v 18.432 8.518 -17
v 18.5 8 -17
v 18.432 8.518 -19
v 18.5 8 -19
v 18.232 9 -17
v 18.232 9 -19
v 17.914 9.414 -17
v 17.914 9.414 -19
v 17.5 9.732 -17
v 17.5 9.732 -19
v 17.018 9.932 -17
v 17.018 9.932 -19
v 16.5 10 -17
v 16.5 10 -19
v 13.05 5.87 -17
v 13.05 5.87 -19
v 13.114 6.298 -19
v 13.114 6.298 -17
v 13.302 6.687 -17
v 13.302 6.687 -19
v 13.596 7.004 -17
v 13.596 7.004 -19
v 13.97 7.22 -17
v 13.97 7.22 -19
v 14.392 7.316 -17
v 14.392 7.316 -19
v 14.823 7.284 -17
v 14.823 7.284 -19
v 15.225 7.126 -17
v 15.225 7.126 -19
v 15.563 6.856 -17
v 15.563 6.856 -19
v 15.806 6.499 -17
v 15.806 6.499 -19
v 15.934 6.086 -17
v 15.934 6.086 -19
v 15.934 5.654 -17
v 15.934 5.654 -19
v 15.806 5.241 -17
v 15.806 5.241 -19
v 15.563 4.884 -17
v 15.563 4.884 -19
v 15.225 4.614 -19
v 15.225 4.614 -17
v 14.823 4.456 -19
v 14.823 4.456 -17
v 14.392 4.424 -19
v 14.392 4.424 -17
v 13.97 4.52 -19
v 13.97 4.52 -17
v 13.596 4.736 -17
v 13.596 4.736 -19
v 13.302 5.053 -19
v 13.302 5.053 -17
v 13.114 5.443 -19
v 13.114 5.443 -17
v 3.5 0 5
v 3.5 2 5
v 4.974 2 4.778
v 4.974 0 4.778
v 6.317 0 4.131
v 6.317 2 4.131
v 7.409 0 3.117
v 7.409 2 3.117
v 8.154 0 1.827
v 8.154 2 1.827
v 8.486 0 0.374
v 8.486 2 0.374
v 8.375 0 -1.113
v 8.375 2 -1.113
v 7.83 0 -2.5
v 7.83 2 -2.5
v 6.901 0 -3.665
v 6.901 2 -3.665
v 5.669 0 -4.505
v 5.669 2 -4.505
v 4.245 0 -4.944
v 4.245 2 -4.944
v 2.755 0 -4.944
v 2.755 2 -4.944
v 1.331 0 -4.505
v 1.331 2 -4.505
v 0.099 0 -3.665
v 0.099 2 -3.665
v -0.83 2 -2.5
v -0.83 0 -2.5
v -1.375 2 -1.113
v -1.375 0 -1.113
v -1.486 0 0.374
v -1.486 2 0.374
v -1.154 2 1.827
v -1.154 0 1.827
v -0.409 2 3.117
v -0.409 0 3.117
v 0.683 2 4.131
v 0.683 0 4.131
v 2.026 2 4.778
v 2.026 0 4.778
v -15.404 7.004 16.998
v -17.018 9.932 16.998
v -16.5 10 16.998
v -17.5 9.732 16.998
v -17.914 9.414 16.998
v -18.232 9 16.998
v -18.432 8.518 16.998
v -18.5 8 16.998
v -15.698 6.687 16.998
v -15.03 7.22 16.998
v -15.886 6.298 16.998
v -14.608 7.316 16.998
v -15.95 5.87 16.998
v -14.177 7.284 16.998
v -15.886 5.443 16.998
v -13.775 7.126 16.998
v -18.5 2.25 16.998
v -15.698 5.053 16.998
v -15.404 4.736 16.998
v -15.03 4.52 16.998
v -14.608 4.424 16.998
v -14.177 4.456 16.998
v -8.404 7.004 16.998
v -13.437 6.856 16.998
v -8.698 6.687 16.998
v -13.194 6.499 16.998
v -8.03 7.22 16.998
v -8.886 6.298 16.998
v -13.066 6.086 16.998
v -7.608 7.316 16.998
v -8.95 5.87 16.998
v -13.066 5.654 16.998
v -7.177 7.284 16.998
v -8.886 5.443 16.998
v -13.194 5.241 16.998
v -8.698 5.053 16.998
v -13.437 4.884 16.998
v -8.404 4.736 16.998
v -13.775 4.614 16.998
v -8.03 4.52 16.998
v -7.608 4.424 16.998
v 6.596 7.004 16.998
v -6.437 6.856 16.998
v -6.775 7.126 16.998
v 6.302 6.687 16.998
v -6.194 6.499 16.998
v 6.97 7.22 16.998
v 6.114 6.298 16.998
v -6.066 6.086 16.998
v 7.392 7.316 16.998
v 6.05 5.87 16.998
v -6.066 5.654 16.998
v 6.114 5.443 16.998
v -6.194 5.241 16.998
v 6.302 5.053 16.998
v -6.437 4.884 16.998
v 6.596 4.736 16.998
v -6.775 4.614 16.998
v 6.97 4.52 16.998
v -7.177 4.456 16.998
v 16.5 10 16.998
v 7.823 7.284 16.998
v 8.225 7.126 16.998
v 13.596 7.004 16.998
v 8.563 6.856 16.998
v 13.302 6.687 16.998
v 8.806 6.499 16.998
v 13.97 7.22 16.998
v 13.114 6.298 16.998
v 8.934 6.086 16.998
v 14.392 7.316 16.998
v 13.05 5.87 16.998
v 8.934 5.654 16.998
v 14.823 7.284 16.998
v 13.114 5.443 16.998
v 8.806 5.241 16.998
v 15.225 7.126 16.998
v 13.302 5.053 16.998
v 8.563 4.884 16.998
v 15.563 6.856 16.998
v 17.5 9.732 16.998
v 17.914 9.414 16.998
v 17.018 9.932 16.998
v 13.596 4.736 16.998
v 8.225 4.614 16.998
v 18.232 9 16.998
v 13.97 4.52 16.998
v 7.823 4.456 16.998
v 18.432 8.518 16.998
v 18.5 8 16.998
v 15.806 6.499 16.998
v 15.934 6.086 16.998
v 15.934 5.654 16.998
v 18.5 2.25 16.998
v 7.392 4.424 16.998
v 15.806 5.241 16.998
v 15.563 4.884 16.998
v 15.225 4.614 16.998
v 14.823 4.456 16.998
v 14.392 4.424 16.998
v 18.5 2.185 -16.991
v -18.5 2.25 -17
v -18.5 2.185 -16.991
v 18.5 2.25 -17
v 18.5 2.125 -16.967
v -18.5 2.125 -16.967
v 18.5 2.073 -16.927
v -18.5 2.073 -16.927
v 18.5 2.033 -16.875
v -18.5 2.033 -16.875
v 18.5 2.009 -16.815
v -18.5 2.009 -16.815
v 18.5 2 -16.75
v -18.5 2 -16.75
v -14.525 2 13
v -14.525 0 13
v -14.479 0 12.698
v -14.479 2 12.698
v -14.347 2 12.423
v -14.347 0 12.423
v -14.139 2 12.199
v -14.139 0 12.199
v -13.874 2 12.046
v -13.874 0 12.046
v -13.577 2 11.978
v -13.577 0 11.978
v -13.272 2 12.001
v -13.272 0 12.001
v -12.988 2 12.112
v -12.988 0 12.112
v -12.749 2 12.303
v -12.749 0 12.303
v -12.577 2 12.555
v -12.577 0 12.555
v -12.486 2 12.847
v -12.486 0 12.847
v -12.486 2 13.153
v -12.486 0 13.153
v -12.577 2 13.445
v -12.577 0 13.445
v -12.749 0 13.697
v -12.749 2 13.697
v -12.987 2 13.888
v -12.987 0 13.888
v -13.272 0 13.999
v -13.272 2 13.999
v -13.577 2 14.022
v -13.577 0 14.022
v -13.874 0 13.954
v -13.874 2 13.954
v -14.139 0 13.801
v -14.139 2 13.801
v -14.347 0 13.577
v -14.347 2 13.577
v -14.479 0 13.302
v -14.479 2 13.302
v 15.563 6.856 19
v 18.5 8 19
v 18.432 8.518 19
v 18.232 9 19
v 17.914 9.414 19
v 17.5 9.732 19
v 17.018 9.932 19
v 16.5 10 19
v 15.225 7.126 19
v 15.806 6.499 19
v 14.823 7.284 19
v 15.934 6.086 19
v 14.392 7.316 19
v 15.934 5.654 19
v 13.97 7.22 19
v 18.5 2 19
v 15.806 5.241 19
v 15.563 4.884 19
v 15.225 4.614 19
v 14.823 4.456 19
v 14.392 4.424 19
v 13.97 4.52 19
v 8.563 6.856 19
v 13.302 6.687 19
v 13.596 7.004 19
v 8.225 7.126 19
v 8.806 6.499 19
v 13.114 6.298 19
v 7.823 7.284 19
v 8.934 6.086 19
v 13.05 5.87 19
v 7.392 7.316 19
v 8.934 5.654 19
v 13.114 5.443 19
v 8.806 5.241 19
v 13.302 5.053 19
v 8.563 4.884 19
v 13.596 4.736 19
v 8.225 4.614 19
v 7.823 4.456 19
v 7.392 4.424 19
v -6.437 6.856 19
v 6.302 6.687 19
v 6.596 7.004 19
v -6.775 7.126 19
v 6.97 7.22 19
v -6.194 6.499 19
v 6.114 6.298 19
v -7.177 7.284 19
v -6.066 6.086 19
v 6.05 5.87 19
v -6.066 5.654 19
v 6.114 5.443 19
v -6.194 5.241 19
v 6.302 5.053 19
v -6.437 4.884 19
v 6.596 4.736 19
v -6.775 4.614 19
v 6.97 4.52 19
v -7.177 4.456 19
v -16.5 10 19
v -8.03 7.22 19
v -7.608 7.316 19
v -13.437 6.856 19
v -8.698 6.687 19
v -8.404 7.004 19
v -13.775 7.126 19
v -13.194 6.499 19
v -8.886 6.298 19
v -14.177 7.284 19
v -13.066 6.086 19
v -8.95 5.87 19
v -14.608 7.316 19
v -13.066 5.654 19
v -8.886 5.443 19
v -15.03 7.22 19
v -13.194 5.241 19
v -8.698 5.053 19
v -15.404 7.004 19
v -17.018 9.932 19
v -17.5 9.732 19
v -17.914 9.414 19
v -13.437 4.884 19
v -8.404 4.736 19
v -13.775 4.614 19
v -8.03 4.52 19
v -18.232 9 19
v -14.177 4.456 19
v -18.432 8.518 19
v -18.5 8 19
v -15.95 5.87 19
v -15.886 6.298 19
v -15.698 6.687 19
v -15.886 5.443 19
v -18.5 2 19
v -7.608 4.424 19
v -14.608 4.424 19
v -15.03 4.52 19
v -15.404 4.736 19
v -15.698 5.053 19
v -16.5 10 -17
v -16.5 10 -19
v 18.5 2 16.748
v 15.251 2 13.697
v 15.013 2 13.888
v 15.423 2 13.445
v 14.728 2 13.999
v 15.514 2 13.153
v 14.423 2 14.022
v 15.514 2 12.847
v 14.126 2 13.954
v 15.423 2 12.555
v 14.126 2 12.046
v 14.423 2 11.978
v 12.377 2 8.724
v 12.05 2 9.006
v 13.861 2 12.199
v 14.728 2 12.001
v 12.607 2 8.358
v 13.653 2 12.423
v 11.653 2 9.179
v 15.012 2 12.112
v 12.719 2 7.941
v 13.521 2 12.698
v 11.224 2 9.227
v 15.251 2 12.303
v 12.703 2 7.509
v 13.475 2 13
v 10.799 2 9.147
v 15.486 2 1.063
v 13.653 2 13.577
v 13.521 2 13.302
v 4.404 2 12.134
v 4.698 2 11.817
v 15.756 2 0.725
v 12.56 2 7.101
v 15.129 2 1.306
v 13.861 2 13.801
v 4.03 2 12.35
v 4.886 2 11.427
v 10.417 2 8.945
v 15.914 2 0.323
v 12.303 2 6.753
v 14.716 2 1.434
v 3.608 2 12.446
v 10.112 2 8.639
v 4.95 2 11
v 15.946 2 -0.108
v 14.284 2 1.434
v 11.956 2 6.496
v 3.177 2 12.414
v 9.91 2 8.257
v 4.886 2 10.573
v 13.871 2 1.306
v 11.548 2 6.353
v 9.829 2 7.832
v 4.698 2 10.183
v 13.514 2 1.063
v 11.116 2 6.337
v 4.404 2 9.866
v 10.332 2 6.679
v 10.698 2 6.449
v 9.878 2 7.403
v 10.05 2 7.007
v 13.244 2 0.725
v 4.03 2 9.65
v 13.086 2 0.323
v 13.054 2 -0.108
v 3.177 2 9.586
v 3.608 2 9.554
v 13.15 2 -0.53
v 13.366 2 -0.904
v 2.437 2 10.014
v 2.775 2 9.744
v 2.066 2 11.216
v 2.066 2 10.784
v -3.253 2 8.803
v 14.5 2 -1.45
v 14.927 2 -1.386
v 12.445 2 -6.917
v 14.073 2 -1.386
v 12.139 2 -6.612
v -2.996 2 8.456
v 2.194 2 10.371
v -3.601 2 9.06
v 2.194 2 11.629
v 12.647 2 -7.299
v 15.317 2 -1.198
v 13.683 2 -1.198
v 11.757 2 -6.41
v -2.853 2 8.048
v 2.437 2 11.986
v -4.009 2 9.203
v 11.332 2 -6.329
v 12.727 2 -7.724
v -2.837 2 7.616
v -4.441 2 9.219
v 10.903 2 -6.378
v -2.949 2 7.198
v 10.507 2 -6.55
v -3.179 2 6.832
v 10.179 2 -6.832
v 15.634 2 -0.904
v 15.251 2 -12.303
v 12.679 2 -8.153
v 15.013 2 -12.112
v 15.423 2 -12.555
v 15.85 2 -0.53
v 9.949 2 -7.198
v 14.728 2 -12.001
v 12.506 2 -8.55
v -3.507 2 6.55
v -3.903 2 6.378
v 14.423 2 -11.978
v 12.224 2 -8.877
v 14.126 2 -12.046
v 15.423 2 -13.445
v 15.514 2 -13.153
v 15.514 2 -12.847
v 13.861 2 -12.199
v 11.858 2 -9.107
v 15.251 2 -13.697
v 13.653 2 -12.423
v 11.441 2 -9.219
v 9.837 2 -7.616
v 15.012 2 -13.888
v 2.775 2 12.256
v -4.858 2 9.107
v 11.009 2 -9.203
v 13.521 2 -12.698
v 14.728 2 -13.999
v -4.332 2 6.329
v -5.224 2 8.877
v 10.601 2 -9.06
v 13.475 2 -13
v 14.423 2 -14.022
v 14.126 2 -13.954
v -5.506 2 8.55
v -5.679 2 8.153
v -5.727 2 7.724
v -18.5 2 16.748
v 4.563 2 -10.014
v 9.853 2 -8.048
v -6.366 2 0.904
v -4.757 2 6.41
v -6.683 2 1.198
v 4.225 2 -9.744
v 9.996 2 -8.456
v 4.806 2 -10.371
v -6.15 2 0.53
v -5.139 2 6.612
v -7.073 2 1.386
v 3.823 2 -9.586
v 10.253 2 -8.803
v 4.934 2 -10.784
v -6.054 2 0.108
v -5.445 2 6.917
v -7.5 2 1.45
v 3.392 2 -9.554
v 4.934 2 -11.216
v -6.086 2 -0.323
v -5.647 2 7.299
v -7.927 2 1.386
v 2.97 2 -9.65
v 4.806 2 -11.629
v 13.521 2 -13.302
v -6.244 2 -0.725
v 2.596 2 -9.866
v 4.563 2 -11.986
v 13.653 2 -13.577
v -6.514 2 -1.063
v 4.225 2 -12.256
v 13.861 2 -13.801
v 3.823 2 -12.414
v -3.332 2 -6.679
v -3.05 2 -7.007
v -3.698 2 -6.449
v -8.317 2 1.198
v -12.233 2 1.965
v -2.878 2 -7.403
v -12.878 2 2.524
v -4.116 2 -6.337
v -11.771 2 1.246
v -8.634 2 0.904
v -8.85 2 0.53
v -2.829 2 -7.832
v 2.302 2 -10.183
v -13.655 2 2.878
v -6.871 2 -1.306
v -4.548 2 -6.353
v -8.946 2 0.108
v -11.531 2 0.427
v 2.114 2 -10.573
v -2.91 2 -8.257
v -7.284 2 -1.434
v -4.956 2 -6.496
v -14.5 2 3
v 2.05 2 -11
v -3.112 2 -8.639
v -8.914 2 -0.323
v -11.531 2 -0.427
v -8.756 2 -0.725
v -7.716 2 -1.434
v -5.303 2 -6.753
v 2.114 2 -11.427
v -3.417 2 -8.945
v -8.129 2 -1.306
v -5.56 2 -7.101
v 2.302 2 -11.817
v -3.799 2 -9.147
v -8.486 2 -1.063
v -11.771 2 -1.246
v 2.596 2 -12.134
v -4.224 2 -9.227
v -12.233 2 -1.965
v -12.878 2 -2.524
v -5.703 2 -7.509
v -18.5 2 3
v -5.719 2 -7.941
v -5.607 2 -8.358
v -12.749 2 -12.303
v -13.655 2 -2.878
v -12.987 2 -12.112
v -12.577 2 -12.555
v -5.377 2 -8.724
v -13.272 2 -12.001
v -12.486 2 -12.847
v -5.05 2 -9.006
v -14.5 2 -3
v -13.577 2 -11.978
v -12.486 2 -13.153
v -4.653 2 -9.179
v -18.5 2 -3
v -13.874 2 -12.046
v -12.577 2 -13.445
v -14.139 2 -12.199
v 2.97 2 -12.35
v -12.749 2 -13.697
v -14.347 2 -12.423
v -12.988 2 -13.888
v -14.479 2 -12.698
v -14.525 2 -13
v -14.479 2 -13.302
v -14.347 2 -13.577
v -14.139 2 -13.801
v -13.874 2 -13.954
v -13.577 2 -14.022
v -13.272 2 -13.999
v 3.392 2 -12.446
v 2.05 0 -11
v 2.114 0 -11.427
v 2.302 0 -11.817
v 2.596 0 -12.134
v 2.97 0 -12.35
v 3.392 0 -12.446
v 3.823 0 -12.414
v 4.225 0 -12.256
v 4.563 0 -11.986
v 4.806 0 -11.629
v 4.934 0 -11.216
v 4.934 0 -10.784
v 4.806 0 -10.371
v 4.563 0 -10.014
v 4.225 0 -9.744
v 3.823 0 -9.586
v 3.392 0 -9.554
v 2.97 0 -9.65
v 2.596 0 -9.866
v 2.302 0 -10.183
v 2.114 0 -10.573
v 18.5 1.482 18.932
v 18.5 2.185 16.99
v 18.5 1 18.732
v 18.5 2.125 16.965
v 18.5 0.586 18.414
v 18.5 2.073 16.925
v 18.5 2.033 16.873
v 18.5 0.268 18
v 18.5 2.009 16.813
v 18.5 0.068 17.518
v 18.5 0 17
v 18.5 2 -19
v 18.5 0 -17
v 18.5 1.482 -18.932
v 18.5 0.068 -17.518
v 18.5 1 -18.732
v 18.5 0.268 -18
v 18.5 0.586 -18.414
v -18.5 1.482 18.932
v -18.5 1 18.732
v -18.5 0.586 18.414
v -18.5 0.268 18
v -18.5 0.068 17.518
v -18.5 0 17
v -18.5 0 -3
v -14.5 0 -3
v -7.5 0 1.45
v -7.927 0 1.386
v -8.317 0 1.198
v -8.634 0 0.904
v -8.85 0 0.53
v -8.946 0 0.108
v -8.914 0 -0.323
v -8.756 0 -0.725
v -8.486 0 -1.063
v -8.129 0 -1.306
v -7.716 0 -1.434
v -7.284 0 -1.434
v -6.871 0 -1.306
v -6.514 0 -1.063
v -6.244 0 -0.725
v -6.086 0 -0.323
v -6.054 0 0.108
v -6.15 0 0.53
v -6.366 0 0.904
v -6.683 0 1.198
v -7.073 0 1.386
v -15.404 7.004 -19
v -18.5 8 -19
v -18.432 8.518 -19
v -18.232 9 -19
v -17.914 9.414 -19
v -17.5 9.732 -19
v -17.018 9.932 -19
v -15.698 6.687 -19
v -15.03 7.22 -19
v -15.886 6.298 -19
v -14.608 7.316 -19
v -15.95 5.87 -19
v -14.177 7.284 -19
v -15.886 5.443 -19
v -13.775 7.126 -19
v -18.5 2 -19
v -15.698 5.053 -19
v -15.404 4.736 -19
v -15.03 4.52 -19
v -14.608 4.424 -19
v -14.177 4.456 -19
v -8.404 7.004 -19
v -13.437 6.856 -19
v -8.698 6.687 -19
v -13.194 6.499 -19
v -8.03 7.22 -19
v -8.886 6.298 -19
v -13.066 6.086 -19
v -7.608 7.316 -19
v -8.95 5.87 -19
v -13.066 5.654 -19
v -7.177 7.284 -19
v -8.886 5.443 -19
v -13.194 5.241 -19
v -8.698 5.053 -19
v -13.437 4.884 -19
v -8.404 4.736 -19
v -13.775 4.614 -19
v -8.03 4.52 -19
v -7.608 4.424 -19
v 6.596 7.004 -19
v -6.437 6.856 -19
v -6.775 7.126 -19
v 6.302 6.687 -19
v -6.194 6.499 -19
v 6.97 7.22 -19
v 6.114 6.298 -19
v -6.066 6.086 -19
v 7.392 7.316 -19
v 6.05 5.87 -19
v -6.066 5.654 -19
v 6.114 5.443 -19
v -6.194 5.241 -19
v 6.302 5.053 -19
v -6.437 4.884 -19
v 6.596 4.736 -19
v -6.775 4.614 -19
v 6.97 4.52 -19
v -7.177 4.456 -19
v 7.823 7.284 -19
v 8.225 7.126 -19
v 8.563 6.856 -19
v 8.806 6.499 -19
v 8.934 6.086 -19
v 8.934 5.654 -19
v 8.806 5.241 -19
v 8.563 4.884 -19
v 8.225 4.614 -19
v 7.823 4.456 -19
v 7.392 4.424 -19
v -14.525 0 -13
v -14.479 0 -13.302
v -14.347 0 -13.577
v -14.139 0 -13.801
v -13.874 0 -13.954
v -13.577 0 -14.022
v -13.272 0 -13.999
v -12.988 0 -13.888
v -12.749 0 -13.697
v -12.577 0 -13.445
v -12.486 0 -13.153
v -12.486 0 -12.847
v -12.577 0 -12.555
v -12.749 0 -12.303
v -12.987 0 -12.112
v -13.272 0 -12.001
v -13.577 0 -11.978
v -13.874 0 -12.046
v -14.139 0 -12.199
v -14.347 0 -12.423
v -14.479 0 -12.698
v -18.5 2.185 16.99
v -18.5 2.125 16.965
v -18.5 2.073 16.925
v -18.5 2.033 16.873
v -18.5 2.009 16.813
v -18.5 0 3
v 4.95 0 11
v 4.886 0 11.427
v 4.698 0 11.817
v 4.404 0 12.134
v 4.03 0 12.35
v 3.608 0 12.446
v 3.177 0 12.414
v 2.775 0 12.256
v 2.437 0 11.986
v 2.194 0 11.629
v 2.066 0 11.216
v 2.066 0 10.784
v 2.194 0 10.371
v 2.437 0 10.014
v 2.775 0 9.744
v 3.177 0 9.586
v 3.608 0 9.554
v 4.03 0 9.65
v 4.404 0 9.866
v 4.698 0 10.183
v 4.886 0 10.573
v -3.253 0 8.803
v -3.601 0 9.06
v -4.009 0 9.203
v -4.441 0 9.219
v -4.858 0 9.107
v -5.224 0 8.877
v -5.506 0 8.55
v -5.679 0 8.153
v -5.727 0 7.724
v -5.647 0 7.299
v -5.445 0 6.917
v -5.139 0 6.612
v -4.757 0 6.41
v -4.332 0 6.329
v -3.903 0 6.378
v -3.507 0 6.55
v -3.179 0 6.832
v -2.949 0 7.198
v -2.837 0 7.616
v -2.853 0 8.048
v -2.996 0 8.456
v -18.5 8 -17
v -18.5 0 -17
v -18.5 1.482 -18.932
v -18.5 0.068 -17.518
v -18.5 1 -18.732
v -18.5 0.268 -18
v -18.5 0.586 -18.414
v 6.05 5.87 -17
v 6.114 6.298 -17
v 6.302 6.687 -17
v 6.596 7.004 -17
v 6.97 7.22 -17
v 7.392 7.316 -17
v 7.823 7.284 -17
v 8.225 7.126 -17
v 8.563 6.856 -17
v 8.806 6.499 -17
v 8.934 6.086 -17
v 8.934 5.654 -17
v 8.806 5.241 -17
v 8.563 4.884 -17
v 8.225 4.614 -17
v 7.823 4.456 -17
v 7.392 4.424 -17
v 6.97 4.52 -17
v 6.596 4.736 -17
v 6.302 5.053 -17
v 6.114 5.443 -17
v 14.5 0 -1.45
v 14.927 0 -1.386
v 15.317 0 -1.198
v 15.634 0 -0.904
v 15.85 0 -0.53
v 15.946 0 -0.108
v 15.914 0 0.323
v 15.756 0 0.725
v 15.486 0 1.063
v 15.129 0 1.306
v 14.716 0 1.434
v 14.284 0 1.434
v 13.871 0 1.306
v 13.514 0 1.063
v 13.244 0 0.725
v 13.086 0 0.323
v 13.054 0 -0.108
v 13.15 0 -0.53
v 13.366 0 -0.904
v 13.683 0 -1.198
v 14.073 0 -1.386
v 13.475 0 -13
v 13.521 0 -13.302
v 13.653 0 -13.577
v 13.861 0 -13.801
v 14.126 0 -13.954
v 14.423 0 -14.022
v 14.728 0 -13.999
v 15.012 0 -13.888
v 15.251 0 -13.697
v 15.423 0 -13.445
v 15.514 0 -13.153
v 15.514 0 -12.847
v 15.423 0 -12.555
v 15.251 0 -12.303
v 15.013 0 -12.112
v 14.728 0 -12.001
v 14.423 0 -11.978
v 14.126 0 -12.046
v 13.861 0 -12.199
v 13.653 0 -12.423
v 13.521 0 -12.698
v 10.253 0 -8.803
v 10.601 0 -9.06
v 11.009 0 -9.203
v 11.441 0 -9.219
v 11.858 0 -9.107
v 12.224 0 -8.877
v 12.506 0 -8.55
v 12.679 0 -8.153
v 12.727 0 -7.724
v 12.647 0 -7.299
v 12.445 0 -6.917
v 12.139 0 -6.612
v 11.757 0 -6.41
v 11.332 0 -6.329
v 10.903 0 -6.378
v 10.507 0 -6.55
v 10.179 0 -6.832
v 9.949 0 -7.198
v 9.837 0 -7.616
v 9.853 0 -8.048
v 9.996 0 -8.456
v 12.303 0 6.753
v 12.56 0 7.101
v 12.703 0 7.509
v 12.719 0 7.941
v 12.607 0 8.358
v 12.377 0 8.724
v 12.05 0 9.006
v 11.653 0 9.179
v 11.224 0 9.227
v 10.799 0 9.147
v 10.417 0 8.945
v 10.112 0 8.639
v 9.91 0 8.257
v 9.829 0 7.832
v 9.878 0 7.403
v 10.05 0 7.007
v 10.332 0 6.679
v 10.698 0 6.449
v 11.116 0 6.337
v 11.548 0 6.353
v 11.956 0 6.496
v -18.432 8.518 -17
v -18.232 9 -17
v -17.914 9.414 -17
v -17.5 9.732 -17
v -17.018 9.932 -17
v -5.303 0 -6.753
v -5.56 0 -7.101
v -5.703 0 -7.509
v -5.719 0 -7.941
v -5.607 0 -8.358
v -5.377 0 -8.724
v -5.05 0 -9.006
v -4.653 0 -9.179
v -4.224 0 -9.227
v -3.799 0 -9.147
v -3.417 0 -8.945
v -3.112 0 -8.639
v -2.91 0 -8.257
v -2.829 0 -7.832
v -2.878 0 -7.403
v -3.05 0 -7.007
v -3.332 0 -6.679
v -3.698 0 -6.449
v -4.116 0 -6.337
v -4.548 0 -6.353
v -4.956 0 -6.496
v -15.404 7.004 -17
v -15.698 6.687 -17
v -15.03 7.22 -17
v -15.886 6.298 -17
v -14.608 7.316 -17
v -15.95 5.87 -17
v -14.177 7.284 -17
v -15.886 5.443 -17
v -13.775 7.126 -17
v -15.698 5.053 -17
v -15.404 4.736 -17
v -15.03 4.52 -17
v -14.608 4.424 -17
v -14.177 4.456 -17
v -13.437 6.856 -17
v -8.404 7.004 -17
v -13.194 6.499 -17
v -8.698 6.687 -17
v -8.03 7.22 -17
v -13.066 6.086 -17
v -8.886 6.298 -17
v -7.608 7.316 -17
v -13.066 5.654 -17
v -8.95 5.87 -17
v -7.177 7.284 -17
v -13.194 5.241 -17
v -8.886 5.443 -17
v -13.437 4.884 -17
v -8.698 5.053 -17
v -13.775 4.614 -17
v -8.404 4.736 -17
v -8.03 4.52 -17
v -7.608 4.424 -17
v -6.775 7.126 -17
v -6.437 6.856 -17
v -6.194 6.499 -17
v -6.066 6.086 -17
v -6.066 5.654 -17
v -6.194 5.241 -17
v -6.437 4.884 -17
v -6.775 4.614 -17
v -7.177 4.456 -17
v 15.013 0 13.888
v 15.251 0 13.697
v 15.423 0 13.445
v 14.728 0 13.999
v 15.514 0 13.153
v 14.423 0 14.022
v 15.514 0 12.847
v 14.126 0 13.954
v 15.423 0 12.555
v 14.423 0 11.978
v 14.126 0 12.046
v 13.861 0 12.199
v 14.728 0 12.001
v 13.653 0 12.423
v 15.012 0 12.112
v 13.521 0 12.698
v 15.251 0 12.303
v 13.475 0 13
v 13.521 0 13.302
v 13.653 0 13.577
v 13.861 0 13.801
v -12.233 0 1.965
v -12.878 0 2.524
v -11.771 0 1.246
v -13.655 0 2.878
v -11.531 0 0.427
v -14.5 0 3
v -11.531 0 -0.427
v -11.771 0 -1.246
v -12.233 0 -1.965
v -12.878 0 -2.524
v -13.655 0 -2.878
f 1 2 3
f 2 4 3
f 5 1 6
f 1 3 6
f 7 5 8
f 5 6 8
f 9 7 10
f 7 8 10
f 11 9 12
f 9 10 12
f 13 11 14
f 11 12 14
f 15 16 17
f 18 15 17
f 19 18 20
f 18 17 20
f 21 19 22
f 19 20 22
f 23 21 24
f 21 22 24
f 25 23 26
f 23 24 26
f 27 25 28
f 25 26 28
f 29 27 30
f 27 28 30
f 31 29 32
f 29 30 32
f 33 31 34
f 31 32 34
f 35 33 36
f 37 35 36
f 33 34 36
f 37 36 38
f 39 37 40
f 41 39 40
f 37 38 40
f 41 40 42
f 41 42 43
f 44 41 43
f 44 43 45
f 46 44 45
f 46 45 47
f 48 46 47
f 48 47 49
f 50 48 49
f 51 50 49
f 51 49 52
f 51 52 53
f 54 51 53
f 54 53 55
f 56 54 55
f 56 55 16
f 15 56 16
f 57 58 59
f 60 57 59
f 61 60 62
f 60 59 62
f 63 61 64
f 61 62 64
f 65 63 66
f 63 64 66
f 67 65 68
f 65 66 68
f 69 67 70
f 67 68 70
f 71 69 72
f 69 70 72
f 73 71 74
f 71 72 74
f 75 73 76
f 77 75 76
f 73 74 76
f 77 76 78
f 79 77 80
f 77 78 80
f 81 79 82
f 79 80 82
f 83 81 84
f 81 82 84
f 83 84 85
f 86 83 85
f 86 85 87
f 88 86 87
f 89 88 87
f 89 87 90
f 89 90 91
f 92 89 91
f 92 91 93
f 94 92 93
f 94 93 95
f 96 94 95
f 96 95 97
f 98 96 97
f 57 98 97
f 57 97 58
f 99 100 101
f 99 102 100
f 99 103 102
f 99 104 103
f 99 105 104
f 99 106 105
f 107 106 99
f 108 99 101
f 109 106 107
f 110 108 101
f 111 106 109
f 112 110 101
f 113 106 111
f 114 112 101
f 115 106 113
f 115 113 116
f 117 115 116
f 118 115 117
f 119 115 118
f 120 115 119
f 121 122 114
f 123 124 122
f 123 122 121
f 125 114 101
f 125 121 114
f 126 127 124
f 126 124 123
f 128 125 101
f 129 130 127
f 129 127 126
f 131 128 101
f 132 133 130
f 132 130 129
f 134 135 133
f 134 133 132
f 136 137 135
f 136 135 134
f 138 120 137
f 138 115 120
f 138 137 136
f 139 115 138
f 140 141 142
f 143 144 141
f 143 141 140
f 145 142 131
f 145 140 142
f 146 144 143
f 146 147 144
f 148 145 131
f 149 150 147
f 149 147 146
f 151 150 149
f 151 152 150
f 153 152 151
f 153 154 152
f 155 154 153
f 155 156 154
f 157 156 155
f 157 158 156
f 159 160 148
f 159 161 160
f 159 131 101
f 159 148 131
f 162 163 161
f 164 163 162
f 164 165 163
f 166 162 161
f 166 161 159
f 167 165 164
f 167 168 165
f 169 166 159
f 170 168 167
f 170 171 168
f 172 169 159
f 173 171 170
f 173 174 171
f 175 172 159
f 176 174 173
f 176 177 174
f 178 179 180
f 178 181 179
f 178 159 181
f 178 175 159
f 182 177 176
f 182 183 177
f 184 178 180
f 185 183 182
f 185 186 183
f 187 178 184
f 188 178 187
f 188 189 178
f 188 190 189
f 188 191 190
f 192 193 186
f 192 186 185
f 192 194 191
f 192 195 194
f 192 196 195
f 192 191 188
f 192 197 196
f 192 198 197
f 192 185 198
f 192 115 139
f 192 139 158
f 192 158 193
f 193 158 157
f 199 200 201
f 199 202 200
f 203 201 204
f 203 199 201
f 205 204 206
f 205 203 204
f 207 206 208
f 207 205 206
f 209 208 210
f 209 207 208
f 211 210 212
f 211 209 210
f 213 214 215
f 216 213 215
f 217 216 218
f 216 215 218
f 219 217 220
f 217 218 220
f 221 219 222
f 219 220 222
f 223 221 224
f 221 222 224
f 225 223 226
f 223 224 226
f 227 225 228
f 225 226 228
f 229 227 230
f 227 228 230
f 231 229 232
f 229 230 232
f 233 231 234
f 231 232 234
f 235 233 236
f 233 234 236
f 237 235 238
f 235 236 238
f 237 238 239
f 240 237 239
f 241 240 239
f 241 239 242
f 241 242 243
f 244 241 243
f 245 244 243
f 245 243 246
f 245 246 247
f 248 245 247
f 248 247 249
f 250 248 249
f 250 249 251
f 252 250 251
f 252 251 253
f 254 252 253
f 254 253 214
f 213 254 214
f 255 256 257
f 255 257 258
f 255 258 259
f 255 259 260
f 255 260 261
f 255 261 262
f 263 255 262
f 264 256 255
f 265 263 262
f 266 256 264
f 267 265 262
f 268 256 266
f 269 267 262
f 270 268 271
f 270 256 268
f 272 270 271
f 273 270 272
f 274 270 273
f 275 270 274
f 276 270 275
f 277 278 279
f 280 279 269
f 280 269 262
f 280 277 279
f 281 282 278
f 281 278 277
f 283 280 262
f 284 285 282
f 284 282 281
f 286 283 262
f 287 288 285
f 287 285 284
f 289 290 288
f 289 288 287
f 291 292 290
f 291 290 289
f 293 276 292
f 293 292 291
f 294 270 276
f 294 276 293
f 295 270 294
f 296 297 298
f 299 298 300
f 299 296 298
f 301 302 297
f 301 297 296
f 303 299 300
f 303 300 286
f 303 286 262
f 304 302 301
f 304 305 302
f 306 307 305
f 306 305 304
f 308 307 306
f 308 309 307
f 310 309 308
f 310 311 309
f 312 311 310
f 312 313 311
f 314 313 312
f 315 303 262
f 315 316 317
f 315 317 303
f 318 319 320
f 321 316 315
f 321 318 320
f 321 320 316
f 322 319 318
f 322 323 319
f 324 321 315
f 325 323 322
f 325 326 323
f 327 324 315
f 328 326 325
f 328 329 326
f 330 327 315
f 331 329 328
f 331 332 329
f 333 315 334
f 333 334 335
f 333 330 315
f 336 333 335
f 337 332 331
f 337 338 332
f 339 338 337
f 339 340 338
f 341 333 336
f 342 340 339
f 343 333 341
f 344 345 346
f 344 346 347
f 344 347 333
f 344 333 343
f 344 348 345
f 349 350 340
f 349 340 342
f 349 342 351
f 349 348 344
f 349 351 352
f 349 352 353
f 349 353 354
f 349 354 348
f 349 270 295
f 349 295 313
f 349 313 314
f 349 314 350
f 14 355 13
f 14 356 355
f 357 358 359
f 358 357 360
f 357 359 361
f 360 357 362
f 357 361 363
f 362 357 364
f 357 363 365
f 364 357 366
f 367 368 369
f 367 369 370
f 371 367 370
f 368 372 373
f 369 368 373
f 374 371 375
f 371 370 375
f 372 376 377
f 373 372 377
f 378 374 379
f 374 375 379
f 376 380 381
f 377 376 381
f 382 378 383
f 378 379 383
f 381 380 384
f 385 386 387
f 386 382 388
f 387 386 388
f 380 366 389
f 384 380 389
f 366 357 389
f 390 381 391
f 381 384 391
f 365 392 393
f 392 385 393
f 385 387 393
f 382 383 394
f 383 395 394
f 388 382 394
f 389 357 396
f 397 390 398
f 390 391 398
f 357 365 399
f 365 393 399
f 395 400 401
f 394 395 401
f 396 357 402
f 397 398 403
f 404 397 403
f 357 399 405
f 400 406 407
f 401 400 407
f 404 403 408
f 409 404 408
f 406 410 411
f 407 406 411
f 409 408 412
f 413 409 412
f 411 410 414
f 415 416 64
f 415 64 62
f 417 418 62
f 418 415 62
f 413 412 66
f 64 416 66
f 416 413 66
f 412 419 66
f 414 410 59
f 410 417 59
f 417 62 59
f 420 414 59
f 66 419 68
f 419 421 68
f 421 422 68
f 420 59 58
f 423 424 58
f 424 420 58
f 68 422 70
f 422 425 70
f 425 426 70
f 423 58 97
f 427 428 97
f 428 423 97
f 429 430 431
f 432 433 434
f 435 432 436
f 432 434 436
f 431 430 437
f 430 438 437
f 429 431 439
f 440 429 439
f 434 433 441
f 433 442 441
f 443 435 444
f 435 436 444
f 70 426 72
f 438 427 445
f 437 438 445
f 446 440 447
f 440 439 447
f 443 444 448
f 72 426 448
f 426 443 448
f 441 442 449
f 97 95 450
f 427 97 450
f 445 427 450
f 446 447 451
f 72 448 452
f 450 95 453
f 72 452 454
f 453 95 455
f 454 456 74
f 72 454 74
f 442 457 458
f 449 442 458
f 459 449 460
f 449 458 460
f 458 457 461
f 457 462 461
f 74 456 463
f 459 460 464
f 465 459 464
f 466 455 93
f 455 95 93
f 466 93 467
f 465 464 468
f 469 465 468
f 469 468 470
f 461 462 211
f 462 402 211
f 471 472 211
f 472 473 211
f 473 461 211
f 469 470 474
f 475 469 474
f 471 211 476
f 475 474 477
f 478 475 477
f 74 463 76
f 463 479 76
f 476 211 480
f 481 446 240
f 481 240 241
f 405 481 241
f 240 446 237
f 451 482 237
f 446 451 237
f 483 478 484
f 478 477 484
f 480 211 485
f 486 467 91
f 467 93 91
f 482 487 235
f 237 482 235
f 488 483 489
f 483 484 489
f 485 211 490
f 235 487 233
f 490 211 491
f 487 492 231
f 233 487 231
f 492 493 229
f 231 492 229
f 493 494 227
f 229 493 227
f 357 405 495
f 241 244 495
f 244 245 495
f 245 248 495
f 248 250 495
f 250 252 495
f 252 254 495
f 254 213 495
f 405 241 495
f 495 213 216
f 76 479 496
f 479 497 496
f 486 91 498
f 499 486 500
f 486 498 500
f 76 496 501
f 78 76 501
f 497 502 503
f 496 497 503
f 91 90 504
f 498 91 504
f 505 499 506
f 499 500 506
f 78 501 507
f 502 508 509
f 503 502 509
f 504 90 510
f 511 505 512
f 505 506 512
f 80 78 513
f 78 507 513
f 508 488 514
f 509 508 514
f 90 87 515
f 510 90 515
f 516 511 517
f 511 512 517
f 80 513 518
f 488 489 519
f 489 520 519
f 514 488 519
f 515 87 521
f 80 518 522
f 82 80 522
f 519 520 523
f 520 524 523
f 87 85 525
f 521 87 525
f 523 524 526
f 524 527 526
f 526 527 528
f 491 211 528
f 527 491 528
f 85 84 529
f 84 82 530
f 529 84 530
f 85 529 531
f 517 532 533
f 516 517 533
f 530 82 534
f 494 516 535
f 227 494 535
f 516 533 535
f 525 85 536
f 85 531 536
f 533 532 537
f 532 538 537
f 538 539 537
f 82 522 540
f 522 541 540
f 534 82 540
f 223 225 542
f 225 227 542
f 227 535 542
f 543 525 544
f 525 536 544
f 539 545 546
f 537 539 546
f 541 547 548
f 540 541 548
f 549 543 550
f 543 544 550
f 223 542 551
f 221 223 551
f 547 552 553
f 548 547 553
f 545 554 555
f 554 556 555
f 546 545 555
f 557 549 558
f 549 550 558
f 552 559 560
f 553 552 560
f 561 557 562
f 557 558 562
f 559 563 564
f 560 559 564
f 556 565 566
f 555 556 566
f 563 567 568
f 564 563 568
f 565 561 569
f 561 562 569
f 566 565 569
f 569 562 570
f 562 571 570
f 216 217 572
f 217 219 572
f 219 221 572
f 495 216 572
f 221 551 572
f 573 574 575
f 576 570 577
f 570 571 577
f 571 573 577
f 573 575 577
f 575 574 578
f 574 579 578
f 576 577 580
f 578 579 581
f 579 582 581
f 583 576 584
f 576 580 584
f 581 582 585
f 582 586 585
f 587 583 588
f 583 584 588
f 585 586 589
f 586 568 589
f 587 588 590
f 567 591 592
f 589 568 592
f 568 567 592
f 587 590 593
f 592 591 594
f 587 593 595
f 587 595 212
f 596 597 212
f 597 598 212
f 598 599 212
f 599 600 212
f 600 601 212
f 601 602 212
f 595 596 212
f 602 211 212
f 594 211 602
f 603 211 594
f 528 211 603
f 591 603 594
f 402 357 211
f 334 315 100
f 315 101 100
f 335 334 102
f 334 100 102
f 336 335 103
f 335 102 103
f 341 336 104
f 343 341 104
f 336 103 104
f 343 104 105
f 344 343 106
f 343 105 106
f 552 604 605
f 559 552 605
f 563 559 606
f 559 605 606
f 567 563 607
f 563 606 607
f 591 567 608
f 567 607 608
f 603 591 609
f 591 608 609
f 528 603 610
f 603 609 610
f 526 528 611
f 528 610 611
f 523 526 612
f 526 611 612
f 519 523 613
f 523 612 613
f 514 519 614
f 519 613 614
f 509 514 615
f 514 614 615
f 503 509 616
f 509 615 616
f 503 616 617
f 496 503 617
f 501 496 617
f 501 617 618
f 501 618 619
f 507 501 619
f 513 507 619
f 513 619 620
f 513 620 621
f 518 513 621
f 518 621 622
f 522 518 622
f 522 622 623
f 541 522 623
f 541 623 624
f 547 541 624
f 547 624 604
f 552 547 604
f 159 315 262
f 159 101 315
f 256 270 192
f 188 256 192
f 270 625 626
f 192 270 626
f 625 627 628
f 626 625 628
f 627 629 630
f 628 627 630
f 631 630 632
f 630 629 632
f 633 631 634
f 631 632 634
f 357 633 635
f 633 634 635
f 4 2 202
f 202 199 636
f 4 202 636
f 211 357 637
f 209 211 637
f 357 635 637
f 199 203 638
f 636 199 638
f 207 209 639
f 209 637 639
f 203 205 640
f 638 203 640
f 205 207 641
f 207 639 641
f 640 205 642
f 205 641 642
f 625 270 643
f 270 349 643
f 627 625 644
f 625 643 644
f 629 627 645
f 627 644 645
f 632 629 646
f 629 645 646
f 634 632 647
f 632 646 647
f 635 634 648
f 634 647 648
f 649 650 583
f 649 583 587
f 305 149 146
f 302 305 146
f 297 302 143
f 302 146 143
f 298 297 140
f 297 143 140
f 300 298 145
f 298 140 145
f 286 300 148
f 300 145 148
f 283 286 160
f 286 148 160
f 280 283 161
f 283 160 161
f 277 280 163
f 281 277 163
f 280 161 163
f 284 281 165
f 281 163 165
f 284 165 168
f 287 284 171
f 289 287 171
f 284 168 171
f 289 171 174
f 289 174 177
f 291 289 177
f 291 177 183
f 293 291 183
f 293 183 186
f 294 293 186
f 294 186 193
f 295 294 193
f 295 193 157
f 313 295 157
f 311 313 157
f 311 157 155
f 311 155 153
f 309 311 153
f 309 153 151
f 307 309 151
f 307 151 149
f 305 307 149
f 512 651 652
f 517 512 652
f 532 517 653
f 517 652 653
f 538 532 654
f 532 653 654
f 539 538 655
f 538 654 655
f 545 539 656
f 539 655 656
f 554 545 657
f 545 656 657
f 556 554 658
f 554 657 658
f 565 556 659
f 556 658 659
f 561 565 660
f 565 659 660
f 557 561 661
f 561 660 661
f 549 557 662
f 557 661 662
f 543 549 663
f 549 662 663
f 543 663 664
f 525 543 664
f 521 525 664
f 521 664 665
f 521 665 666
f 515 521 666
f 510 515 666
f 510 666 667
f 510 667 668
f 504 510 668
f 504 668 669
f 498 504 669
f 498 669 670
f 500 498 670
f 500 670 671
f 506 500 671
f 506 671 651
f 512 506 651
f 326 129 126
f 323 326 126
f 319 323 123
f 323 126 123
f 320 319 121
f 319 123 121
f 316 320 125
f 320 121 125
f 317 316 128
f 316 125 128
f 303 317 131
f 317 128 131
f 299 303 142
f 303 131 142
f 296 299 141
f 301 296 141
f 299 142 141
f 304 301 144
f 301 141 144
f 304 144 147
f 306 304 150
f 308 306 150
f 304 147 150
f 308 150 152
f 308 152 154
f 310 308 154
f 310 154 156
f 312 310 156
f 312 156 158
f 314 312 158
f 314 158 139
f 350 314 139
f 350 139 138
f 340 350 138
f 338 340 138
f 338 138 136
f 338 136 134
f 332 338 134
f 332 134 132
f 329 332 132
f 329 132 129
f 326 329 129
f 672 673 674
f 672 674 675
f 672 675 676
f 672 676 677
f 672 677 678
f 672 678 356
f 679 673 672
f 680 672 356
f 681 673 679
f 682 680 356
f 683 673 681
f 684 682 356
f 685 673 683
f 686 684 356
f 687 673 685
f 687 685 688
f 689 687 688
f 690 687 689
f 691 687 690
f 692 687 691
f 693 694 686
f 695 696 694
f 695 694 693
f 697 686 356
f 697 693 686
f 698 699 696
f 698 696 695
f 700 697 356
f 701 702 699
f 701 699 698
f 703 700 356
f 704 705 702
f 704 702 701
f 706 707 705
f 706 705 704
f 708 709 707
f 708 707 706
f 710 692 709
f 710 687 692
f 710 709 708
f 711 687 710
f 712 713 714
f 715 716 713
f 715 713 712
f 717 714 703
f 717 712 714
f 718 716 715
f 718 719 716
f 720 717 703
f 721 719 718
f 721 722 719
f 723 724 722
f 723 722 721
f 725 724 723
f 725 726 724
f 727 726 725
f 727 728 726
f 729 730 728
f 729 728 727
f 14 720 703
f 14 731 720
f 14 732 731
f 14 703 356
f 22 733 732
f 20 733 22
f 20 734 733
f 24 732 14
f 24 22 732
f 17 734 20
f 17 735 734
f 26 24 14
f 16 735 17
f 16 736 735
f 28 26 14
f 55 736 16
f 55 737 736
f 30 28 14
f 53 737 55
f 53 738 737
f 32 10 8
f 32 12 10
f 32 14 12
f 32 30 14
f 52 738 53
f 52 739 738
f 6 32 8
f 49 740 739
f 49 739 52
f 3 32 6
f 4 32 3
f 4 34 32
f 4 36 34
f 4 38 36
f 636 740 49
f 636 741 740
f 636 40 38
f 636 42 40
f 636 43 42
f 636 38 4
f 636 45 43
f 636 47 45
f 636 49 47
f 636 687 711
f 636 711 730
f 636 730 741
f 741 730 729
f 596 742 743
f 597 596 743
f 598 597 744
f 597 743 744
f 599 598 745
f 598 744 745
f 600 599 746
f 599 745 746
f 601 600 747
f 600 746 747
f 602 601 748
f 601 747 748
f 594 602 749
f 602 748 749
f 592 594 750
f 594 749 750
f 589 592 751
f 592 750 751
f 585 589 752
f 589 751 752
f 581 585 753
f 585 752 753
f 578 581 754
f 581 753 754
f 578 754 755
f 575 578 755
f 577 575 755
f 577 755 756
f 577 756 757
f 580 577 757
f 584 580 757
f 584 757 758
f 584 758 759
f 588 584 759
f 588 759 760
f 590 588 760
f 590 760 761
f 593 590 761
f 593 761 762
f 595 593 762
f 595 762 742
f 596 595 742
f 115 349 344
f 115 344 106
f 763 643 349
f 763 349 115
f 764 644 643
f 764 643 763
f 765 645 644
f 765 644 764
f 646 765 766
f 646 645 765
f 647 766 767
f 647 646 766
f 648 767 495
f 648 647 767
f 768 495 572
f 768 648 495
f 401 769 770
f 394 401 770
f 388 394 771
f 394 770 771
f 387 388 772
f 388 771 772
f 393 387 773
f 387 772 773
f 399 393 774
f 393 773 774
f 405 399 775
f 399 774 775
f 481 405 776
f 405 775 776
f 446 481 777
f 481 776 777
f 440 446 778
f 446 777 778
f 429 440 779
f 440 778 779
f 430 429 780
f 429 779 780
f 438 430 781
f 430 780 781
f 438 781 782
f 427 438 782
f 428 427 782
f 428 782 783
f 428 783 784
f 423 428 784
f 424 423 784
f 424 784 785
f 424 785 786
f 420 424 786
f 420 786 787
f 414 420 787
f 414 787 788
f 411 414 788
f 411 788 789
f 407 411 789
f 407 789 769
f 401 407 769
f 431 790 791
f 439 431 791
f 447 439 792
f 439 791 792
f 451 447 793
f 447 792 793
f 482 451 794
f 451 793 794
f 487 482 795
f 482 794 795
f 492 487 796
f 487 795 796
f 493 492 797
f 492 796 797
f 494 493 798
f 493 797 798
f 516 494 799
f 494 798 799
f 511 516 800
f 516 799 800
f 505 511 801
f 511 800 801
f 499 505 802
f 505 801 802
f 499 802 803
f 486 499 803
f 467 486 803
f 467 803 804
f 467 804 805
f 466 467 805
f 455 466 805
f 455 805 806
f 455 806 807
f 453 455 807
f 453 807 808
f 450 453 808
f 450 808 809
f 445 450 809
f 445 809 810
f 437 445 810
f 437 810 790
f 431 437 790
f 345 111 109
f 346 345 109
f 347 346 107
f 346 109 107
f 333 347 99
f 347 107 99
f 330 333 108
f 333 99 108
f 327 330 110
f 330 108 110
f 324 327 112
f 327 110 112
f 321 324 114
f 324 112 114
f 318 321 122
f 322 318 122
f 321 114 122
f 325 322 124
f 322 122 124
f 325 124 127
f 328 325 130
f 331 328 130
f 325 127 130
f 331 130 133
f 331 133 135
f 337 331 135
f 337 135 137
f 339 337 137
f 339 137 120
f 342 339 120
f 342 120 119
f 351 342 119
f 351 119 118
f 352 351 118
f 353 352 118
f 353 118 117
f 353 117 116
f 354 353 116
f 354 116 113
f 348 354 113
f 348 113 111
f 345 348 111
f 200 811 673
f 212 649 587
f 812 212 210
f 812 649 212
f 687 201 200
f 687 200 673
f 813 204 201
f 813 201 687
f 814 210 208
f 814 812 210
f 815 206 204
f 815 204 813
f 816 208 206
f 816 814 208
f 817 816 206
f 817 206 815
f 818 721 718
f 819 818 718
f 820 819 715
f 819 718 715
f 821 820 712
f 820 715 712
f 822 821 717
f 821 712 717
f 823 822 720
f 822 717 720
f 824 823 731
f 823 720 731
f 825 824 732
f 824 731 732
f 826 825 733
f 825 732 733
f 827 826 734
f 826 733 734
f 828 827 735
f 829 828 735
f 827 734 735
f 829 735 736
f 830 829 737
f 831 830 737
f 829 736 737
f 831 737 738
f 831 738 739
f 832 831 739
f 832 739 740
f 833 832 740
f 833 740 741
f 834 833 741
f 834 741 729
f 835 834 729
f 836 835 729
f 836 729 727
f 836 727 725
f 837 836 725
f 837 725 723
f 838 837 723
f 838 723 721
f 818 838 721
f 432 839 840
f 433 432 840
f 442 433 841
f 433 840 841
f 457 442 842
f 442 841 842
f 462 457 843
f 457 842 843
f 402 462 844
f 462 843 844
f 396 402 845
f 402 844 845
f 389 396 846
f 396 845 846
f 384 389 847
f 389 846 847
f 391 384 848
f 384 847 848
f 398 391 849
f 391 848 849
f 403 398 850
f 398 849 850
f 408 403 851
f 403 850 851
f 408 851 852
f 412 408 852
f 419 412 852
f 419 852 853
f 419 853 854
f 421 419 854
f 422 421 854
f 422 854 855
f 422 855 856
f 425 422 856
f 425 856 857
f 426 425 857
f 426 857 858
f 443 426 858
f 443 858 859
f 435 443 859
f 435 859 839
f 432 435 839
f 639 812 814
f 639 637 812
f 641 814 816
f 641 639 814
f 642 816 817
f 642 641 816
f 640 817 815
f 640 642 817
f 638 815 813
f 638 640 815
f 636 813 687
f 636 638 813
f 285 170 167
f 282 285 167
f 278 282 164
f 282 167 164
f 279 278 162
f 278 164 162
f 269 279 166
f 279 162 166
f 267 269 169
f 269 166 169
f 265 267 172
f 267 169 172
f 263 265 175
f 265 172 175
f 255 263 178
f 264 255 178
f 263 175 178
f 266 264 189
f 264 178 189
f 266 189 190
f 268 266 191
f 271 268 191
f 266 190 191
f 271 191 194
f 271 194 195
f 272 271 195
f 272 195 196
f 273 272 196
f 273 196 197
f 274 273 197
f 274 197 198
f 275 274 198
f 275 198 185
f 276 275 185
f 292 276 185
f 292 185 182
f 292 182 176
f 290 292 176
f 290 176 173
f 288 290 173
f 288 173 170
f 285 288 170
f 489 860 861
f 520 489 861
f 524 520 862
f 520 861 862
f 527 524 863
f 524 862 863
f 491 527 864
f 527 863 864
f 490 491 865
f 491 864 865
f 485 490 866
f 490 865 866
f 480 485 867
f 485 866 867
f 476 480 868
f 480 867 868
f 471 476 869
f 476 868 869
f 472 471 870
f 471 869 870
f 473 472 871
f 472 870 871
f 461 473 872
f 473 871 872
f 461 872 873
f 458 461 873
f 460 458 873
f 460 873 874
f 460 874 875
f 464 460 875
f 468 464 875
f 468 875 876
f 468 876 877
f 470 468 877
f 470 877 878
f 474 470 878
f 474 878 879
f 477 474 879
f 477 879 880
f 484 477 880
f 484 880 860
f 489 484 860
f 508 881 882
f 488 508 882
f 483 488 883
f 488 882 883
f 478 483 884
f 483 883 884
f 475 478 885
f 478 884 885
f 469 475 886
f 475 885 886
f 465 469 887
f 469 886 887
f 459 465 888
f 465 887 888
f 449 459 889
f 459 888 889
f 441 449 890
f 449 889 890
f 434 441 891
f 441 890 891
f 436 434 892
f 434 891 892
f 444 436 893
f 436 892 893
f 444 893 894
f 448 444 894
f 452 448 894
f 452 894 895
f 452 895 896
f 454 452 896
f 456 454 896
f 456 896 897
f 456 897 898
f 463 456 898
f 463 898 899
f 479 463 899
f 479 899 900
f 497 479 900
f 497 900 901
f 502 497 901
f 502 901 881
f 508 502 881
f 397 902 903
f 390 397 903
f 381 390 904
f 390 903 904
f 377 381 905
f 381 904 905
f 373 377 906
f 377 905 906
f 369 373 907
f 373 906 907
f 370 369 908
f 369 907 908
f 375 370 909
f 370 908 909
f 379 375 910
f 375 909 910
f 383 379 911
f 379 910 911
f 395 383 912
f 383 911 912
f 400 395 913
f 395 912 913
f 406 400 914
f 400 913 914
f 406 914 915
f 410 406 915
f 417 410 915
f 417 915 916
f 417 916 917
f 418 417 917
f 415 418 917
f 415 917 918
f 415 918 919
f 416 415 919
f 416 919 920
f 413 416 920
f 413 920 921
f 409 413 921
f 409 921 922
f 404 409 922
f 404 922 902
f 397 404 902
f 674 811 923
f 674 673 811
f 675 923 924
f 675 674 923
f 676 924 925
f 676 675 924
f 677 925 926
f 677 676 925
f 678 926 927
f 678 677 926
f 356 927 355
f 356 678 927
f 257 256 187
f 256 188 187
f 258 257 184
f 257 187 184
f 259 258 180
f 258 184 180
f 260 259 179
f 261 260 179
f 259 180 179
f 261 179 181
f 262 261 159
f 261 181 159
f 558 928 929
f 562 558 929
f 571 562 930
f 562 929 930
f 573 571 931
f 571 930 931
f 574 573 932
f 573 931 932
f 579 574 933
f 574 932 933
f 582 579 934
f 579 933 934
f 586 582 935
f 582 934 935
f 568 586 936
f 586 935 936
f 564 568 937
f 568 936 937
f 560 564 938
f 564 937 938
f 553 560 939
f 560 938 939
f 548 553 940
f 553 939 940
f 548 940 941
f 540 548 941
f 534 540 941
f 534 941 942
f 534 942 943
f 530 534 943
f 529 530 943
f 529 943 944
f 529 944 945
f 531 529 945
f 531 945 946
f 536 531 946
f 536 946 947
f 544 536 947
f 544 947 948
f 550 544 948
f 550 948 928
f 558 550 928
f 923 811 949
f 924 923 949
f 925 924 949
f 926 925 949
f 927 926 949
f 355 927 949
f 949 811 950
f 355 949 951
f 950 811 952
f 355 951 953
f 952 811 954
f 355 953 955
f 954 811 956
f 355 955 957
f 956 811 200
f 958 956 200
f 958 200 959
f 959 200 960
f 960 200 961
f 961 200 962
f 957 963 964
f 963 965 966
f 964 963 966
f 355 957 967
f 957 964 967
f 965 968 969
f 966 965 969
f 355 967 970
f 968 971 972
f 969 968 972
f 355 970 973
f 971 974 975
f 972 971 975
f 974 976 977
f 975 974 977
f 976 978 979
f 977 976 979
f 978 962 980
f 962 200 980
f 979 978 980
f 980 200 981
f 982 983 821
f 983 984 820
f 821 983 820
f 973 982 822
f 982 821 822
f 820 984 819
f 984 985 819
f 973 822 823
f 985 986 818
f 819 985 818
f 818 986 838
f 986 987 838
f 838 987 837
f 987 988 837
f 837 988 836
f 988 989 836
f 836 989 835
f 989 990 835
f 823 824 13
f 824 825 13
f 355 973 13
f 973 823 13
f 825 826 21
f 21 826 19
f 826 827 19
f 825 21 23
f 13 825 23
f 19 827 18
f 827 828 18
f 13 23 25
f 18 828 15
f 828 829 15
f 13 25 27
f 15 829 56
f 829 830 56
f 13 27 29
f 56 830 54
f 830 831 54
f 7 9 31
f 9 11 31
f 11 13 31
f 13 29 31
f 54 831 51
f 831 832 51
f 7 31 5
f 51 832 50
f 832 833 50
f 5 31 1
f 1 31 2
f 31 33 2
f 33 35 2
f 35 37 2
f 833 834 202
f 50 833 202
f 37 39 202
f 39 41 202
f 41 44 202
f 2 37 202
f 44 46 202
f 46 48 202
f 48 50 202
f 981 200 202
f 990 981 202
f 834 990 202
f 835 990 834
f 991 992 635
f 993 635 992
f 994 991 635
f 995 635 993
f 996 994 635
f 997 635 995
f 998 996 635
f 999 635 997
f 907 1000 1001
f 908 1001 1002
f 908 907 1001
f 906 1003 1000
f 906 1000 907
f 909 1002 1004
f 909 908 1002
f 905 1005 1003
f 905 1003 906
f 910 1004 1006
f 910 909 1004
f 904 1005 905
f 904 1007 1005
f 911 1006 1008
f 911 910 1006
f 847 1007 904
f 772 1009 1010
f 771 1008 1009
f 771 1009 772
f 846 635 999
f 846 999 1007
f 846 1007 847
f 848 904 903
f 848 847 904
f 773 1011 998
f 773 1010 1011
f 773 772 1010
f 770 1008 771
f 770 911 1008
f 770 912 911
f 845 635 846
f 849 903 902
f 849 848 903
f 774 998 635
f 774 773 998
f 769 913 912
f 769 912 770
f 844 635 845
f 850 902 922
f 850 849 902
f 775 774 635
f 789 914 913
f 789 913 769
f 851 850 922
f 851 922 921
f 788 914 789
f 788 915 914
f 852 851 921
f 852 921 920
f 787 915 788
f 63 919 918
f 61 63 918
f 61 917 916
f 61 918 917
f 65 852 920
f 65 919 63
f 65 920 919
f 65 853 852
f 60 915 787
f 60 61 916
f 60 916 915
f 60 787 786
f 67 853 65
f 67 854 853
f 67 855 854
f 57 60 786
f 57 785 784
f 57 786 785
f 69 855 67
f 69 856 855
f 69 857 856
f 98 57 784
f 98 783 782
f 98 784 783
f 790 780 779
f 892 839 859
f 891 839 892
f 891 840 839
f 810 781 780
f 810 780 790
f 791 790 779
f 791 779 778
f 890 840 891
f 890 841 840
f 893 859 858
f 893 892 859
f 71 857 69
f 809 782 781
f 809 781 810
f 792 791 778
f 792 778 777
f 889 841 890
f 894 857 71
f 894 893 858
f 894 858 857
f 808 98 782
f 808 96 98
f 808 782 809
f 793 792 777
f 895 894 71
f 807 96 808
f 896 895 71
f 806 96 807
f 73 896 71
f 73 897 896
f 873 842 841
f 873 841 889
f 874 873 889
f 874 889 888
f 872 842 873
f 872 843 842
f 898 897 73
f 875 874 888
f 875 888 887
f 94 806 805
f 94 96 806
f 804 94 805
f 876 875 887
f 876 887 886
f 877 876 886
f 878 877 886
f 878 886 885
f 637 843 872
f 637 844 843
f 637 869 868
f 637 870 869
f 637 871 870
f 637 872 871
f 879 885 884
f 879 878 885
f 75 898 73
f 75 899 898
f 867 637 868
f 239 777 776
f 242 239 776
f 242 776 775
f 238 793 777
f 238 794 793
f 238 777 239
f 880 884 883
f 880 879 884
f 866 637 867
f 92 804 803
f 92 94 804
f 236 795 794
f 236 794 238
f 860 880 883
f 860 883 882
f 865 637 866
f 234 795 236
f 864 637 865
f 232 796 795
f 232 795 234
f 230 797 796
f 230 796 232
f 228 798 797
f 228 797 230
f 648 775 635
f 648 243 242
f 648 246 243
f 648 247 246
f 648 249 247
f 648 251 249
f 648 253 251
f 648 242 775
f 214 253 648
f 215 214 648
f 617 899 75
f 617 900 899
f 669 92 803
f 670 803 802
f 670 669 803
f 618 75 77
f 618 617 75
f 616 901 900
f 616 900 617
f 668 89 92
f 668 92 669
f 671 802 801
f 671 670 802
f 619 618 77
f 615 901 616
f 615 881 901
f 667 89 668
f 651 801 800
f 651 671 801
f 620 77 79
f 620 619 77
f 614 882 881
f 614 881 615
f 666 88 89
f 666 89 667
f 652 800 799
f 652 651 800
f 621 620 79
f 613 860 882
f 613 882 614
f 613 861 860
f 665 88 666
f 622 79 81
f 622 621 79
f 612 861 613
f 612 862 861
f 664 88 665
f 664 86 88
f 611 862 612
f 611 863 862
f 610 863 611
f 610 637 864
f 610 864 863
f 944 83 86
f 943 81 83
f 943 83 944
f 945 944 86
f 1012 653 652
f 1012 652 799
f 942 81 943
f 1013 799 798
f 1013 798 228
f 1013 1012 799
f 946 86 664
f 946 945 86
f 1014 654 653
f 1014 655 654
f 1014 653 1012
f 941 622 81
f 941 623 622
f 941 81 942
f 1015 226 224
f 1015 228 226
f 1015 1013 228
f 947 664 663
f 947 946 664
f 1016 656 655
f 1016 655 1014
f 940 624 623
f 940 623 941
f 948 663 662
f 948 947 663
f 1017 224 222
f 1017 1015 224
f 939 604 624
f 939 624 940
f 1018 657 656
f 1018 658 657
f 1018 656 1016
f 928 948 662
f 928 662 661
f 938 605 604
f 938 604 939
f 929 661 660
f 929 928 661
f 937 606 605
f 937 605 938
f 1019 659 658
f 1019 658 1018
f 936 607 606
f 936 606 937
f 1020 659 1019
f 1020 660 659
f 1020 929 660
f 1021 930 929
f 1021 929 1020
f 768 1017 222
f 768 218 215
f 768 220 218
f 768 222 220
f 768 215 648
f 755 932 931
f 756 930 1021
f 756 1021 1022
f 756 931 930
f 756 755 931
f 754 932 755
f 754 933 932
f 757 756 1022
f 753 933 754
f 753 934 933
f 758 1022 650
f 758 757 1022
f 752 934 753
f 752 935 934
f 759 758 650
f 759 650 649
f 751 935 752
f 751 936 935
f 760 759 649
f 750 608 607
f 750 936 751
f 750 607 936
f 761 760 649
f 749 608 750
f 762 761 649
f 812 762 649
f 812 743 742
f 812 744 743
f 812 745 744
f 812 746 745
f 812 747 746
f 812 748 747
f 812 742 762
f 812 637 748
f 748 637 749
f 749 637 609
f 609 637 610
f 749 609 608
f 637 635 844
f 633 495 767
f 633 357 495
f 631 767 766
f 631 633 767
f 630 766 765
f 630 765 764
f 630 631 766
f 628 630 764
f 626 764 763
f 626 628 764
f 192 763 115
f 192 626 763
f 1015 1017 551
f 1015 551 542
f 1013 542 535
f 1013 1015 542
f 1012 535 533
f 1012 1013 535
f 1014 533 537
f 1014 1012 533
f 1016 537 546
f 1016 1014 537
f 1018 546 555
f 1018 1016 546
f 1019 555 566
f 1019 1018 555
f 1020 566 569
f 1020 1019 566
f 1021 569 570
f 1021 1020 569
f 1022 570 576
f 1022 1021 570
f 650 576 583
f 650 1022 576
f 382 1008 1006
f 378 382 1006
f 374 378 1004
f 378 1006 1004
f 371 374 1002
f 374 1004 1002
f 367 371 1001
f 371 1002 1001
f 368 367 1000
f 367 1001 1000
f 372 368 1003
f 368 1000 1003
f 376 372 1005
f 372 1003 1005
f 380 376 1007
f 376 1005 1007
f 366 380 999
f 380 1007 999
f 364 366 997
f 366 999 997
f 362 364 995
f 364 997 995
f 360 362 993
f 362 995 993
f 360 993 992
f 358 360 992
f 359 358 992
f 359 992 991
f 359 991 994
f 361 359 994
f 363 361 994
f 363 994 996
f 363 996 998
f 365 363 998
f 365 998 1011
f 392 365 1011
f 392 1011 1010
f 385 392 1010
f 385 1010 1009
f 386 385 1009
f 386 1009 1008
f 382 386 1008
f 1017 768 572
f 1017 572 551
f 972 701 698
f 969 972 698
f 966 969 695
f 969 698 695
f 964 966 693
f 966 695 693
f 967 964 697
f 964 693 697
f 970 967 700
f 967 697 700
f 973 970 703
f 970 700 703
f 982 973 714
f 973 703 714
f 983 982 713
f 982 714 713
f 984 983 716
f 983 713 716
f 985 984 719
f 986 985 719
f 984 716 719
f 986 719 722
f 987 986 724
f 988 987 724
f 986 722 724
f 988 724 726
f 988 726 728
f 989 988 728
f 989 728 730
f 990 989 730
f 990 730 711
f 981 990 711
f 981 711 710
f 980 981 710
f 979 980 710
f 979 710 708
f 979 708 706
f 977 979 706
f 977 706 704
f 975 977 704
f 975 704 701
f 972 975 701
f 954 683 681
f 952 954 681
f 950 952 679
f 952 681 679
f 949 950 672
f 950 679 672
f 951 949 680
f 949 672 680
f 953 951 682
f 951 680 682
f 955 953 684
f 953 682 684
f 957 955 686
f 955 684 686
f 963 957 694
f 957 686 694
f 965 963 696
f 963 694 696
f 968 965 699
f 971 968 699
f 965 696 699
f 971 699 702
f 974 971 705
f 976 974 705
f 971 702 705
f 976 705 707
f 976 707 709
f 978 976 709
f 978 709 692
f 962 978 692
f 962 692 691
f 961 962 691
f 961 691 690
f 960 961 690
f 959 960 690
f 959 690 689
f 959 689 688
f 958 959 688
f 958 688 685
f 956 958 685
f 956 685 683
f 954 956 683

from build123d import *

# Parameters (mm, degrees)
BOSS_EXTRUDE1_DEPTH       = 2
SKETCH2_W                 = 37
SKETCH2_H                 = 2
SKETCH2_H_2               = 2.001734714
BOSS_EXTRUDE2_DEPTH       = 8
FILLET1_R                 = 2
FILLET2_R                 = 0.25
TAP_DRILL_FOR_M2_5_TAP1_D = 2.05
SKETCH5_R                 = 5
CUT_EXTRUDE1_DEPTH        = 28.699277969
M2_5_CLEARANCE_HOLE1_D    = 2.9
CIRPATTERN1_COUNT         = 8
M2_5_CLEARANCE_HOLE2_D    = 2.9


with BuildPart() as part:
    # Sketch1 → Boss-Extrude1 (new body)
    with BuildSketch(Plane(origin=(0, 0, 0), x_dir=(1, 0, 0), z_dir=(0, 1, 0))):
        with BuildLine():
            Line((-14.5, 3), (-18.5, 3))
            Line((-18.5, 3), (-18.5, 19))
            Line((-18.5, 19), (18.5, 19))
            Line((18.5, 19), (18.5, -19))
            Line((18.5, -19), (-18.5, -19))
            Line((-18.5, -19), (-18.5, -3))
            Line((-18.5, -3), (-14.5, -3))
            ThreePointArc((-14.5, -3), (-11.5, 0), (-14.5, 3))
        make_face()
    extrude(amount=BOSS_EXTRUDE1_DEPTH)

    # Sketch2 → Boss-Extrude2 (add)
    with BuildSketch(Plane(origin=(0, 2, 0), x_dir=(1, 0, 0), z_dir=(0, 1, 0))):
        with Locations((0, 18)):
            Rectangle(SKETCH2_W, SKETCH2_H)
        with Locations((0, -17.999132643)):
            Rectangle(SKETCH2_W, SKETCH2_H_2)
    extrude(amount=BOSS_EXTRUDE2_DEPTH)

    # Fillet1
    fillet1_edges = [part.edges().sort_by_distance(p)[0] for p in [
        (0, 0, -19),
        (-18.5, 10, -18),
        (18.5, 10, -18),
        (-18.5, 10, 17.999132643),
        (18.5, 10, 17.999132643),
        (0, 0, 19),
    ]]
    fillet(fillet1_edges, radius=FILLET1_R)

    # Fillet2
    fillet2_edges = [part.edges().sort_by_distance(p)[0] for p in [
        (0, 2, -17),
        (0, 2, 16.998265286),
    ]]
    fillet(fillet2_edges, radius=FILLET2_R)

    # Tap Drill for M2.5 Tap1 (through all)
    with Locations(Plane(origin=(0, 2, 0), x_dir=(1, 0, 0), z_dir=(0, 1, 0))):
        with Locations((-13.5, 13), (14.5, 13), (14.5, -13), (-13.5, -13)):
            Hole(TAP_DRILL_FOR_M2_5_TAP1_D / 2)

    # Sketch5 → Cut-Extrude1 (cut, through all)
    with BuildSketch(Plane(origin=(0, 2, 0), x_dir=(1, 0, 0), z_dir=(0, 1, 0))):
        with Locations(Location((3.5, 0, 0), (0, 0, 270))):
            Circle(SKETCH5_R)
    extrude(amount=-CUT_EXTRUDE1_DEPTH, mode=Mode.SUBTRACT)

    # M2.5 Clearance Hole1 (through all)
    with Locations(Plane(origin=(0, 2, 0), x_dir=(1, 0, 0), z_dir=(0, 1, 0))):
        with Locations((3.5, 11)):
            m2_5_clearance_hole1 = Hole(M2_5_CLEARANCE_HOLE1_D / 2)

    # CirPattern1: M2.5 Clearance Hole1 ×8 about axis
    cirpattern1_axis = Axis((3.5, 0, 0), (0, 1, 0))
    for i in range(1, CIRPATTERN1_COUNT):
        add(m2_5_clearance_hole1.rotate(cirpattern1_axis, i * 360 / CIRPATTERN1_COUNT), mode=Mode.SUBTRACT)

    # M2.5 Clearance Hole2 (through all)
    with Locations(Plane.XY.offset(19)):
        with Locations((-14.5, 5.870134778), (-7.5, 5.870134778), (7.5, 5.870134778), (14.5, 5.870134778)):
            Hole(M2_5_CLEARANCE_HOLE2_D / 2)


solid = part.part
